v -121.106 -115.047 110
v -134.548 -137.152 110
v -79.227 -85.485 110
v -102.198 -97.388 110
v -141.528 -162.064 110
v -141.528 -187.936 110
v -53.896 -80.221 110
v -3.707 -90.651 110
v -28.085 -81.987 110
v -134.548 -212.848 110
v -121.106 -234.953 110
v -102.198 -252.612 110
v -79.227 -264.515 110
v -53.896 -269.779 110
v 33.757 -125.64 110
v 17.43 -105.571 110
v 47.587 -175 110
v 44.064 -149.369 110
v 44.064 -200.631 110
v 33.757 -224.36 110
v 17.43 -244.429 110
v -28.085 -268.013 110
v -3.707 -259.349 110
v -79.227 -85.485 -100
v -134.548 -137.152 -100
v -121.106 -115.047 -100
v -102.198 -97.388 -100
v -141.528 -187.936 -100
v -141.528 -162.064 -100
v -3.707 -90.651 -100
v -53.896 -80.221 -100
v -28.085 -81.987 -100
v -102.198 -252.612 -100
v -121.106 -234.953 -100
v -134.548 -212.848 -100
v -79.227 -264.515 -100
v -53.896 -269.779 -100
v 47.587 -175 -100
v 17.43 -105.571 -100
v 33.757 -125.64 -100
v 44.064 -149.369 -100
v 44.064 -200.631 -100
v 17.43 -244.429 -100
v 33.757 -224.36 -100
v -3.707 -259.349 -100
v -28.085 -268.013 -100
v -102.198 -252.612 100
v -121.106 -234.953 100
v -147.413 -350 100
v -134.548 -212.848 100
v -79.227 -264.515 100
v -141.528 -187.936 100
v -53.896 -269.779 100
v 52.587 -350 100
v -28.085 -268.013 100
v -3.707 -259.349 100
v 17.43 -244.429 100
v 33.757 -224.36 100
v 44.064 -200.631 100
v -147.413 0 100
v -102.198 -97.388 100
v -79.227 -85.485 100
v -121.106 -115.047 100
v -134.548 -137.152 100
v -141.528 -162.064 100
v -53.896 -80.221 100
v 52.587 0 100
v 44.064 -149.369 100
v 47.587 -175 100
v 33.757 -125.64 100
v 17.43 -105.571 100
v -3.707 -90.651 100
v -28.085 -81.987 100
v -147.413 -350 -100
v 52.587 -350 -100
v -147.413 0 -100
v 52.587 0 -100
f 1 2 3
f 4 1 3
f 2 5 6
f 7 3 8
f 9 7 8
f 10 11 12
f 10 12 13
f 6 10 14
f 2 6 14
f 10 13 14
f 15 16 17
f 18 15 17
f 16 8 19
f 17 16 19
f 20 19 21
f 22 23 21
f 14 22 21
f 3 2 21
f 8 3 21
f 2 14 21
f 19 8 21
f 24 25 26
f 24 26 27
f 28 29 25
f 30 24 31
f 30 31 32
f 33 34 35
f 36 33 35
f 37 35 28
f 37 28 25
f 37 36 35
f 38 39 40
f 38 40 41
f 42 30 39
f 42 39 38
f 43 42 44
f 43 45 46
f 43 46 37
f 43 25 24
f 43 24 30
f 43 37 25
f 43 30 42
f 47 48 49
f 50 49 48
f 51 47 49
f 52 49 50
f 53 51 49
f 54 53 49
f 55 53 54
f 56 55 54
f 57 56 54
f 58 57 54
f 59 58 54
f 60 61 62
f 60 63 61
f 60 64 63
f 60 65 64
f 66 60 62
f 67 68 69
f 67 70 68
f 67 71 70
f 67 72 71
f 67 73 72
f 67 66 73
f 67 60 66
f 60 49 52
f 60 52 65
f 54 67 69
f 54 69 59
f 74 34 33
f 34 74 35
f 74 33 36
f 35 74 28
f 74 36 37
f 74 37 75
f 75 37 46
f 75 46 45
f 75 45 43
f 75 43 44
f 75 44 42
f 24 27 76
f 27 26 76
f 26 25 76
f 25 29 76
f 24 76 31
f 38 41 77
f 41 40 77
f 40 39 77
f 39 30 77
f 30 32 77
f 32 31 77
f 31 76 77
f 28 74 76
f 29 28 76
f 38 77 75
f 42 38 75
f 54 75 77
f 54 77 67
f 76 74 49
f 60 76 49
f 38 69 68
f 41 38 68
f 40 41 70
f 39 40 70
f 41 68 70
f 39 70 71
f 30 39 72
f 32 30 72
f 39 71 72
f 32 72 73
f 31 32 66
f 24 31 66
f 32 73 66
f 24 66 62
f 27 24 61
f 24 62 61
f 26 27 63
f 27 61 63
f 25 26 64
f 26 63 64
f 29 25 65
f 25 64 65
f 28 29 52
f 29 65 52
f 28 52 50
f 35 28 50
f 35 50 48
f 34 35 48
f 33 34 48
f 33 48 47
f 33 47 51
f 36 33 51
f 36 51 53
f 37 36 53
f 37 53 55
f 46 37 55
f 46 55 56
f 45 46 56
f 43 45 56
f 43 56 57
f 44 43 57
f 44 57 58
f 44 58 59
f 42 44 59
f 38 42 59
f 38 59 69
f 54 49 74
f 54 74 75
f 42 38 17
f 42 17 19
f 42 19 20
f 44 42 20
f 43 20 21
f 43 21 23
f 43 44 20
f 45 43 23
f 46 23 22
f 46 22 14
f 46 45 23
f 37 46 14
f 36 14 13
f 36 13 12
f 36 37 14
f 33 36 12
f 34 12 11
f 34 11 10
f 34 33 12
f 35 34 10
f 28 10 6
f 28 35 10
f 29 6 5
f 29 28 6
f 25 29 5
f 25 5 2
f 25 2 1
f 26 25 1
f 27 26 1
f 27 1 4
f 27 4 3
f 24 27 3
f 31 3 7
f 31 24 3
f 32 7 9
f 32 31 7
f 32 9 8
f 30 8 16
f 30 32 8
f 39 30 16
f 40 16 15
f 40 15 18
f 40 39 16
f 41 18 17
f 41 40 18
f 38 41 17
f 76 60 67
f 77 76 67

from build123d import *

# Parameters (mm, degrees)
F3_W     = 200
F3_H     = 200
F4_DEPTH = 350
F5_R     = 95
F6_DEPTH = 200.001
F7_R     = 95
F8_DEPTH = 210


with BuildPart() as f4:
    # F3 (on Front) → F4 (new body)
    with BuildSketch(Plane.XZ):
        with Locations((-47.4129579961, 0)):
            Rectangle(F3_W, F3_H)
    extrude(amount=F4_DEPTH)

    # F5 (on face) → F6 (cut, through all)
    with BuildSketch(Plane.XY.offset(100)):
        with Locations((-47.4129579961, -175)):
            Circle(F5_R)
    extrude(amount=-F6_DEPTH, mode=Mode.SUBTRACT)


with BuildPart() as f8:
    # F7 (on face) → F8 (new body)
    with BuildSketch(Plane(origin=(0, 0, -100), x_dir=(1, 0, 0), z_dir=(0, 0, -1))):
        with Locations((-47.4129579961, 175)):
            Circle(F7_R)
    extrude(amount=-F8_DEPTH)


solid = Compound([f4.part, f8.part])
